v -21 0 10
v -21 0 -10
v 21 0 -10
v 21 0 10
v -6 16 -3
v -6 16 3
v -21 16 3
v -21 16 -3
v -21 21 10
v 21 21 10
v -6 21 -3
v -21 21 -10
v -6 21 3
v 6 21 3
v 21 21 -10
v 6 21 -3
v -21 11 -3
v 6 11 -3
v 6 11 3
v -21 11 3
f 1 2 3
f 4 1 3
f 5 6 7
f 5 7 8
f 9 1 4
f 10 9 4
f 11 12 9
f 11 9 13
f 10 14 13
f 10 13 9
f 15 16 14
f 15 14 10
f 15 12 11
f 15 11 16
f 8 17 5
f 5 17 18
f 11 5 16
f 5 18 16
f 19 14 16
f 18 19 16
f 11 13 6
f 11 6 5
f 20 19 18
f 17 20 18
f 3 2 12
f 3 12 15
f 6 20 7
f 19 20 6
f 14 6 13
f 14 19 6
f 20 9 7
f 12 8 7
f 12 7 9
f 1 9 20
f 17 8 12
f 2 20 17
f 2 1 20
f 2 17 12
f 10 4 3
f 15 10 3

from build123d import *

# Parameters (mm, degrees)
ESQUISSE1_W             = 42
ESQUISSE1_H             = 20
BOSS_EXTRU_1_DEPTH      = 21
ESQUISSE2_W             = 12
ESQUISSE2_H             = 6
ENL_V_MAT_EXTRU_1_DEPTH = 10
ESQUISSE3_W             = 6
ESQUISSE3_H             = 5
ENL_V_MAT_EXTRU_2_DEPTH = 36.637059362


with BuildPart() as part:
    # Esquisse1 → Boss.-Extru.1 (new body)
    with BuildSketch(Plane(origin=(0, 0, 0), x_dir=(1, 0, 0), z_dir=(0, 1, 0))):
        Rectangle(ESQUISSE1_W, ESQUISSE1_H)
    extrude(amount=BOSS_EXTRU_1_DEPTH)

    # Esquisse2 → Enlèv. mat.-Extru.1 (cut)
    with BuildSketch(Plane(origin=(0, 21, 0), x_dir=(1, 0, 0), z_dir=(0, 1, 0))):
        Rectangle(ESQUISSE2_W, ESQUISSE2_H)
    extrude(amount=-ENL_V_MAT_EXTRU_1_DEPTH, mode=Mode.SUBTRACT)

    # Esquisse3 → Enlèv. mat.-Extru.2 (cut, through all)
    with BuildSketch(Plane(origin=(-6, 0, 0), x_dir=(0, 0, -1), z_dir=(1, 0, 0))):
        with Locations((0, 13.5)):
            Rectangle(ESQUISSE3_W, ESQUISSE3_H)
    extrude(amount=-ENL_V_MAT_EXTRU_2_DEPTH, mode=Mode.SUBTRACT)


solid = part.part
